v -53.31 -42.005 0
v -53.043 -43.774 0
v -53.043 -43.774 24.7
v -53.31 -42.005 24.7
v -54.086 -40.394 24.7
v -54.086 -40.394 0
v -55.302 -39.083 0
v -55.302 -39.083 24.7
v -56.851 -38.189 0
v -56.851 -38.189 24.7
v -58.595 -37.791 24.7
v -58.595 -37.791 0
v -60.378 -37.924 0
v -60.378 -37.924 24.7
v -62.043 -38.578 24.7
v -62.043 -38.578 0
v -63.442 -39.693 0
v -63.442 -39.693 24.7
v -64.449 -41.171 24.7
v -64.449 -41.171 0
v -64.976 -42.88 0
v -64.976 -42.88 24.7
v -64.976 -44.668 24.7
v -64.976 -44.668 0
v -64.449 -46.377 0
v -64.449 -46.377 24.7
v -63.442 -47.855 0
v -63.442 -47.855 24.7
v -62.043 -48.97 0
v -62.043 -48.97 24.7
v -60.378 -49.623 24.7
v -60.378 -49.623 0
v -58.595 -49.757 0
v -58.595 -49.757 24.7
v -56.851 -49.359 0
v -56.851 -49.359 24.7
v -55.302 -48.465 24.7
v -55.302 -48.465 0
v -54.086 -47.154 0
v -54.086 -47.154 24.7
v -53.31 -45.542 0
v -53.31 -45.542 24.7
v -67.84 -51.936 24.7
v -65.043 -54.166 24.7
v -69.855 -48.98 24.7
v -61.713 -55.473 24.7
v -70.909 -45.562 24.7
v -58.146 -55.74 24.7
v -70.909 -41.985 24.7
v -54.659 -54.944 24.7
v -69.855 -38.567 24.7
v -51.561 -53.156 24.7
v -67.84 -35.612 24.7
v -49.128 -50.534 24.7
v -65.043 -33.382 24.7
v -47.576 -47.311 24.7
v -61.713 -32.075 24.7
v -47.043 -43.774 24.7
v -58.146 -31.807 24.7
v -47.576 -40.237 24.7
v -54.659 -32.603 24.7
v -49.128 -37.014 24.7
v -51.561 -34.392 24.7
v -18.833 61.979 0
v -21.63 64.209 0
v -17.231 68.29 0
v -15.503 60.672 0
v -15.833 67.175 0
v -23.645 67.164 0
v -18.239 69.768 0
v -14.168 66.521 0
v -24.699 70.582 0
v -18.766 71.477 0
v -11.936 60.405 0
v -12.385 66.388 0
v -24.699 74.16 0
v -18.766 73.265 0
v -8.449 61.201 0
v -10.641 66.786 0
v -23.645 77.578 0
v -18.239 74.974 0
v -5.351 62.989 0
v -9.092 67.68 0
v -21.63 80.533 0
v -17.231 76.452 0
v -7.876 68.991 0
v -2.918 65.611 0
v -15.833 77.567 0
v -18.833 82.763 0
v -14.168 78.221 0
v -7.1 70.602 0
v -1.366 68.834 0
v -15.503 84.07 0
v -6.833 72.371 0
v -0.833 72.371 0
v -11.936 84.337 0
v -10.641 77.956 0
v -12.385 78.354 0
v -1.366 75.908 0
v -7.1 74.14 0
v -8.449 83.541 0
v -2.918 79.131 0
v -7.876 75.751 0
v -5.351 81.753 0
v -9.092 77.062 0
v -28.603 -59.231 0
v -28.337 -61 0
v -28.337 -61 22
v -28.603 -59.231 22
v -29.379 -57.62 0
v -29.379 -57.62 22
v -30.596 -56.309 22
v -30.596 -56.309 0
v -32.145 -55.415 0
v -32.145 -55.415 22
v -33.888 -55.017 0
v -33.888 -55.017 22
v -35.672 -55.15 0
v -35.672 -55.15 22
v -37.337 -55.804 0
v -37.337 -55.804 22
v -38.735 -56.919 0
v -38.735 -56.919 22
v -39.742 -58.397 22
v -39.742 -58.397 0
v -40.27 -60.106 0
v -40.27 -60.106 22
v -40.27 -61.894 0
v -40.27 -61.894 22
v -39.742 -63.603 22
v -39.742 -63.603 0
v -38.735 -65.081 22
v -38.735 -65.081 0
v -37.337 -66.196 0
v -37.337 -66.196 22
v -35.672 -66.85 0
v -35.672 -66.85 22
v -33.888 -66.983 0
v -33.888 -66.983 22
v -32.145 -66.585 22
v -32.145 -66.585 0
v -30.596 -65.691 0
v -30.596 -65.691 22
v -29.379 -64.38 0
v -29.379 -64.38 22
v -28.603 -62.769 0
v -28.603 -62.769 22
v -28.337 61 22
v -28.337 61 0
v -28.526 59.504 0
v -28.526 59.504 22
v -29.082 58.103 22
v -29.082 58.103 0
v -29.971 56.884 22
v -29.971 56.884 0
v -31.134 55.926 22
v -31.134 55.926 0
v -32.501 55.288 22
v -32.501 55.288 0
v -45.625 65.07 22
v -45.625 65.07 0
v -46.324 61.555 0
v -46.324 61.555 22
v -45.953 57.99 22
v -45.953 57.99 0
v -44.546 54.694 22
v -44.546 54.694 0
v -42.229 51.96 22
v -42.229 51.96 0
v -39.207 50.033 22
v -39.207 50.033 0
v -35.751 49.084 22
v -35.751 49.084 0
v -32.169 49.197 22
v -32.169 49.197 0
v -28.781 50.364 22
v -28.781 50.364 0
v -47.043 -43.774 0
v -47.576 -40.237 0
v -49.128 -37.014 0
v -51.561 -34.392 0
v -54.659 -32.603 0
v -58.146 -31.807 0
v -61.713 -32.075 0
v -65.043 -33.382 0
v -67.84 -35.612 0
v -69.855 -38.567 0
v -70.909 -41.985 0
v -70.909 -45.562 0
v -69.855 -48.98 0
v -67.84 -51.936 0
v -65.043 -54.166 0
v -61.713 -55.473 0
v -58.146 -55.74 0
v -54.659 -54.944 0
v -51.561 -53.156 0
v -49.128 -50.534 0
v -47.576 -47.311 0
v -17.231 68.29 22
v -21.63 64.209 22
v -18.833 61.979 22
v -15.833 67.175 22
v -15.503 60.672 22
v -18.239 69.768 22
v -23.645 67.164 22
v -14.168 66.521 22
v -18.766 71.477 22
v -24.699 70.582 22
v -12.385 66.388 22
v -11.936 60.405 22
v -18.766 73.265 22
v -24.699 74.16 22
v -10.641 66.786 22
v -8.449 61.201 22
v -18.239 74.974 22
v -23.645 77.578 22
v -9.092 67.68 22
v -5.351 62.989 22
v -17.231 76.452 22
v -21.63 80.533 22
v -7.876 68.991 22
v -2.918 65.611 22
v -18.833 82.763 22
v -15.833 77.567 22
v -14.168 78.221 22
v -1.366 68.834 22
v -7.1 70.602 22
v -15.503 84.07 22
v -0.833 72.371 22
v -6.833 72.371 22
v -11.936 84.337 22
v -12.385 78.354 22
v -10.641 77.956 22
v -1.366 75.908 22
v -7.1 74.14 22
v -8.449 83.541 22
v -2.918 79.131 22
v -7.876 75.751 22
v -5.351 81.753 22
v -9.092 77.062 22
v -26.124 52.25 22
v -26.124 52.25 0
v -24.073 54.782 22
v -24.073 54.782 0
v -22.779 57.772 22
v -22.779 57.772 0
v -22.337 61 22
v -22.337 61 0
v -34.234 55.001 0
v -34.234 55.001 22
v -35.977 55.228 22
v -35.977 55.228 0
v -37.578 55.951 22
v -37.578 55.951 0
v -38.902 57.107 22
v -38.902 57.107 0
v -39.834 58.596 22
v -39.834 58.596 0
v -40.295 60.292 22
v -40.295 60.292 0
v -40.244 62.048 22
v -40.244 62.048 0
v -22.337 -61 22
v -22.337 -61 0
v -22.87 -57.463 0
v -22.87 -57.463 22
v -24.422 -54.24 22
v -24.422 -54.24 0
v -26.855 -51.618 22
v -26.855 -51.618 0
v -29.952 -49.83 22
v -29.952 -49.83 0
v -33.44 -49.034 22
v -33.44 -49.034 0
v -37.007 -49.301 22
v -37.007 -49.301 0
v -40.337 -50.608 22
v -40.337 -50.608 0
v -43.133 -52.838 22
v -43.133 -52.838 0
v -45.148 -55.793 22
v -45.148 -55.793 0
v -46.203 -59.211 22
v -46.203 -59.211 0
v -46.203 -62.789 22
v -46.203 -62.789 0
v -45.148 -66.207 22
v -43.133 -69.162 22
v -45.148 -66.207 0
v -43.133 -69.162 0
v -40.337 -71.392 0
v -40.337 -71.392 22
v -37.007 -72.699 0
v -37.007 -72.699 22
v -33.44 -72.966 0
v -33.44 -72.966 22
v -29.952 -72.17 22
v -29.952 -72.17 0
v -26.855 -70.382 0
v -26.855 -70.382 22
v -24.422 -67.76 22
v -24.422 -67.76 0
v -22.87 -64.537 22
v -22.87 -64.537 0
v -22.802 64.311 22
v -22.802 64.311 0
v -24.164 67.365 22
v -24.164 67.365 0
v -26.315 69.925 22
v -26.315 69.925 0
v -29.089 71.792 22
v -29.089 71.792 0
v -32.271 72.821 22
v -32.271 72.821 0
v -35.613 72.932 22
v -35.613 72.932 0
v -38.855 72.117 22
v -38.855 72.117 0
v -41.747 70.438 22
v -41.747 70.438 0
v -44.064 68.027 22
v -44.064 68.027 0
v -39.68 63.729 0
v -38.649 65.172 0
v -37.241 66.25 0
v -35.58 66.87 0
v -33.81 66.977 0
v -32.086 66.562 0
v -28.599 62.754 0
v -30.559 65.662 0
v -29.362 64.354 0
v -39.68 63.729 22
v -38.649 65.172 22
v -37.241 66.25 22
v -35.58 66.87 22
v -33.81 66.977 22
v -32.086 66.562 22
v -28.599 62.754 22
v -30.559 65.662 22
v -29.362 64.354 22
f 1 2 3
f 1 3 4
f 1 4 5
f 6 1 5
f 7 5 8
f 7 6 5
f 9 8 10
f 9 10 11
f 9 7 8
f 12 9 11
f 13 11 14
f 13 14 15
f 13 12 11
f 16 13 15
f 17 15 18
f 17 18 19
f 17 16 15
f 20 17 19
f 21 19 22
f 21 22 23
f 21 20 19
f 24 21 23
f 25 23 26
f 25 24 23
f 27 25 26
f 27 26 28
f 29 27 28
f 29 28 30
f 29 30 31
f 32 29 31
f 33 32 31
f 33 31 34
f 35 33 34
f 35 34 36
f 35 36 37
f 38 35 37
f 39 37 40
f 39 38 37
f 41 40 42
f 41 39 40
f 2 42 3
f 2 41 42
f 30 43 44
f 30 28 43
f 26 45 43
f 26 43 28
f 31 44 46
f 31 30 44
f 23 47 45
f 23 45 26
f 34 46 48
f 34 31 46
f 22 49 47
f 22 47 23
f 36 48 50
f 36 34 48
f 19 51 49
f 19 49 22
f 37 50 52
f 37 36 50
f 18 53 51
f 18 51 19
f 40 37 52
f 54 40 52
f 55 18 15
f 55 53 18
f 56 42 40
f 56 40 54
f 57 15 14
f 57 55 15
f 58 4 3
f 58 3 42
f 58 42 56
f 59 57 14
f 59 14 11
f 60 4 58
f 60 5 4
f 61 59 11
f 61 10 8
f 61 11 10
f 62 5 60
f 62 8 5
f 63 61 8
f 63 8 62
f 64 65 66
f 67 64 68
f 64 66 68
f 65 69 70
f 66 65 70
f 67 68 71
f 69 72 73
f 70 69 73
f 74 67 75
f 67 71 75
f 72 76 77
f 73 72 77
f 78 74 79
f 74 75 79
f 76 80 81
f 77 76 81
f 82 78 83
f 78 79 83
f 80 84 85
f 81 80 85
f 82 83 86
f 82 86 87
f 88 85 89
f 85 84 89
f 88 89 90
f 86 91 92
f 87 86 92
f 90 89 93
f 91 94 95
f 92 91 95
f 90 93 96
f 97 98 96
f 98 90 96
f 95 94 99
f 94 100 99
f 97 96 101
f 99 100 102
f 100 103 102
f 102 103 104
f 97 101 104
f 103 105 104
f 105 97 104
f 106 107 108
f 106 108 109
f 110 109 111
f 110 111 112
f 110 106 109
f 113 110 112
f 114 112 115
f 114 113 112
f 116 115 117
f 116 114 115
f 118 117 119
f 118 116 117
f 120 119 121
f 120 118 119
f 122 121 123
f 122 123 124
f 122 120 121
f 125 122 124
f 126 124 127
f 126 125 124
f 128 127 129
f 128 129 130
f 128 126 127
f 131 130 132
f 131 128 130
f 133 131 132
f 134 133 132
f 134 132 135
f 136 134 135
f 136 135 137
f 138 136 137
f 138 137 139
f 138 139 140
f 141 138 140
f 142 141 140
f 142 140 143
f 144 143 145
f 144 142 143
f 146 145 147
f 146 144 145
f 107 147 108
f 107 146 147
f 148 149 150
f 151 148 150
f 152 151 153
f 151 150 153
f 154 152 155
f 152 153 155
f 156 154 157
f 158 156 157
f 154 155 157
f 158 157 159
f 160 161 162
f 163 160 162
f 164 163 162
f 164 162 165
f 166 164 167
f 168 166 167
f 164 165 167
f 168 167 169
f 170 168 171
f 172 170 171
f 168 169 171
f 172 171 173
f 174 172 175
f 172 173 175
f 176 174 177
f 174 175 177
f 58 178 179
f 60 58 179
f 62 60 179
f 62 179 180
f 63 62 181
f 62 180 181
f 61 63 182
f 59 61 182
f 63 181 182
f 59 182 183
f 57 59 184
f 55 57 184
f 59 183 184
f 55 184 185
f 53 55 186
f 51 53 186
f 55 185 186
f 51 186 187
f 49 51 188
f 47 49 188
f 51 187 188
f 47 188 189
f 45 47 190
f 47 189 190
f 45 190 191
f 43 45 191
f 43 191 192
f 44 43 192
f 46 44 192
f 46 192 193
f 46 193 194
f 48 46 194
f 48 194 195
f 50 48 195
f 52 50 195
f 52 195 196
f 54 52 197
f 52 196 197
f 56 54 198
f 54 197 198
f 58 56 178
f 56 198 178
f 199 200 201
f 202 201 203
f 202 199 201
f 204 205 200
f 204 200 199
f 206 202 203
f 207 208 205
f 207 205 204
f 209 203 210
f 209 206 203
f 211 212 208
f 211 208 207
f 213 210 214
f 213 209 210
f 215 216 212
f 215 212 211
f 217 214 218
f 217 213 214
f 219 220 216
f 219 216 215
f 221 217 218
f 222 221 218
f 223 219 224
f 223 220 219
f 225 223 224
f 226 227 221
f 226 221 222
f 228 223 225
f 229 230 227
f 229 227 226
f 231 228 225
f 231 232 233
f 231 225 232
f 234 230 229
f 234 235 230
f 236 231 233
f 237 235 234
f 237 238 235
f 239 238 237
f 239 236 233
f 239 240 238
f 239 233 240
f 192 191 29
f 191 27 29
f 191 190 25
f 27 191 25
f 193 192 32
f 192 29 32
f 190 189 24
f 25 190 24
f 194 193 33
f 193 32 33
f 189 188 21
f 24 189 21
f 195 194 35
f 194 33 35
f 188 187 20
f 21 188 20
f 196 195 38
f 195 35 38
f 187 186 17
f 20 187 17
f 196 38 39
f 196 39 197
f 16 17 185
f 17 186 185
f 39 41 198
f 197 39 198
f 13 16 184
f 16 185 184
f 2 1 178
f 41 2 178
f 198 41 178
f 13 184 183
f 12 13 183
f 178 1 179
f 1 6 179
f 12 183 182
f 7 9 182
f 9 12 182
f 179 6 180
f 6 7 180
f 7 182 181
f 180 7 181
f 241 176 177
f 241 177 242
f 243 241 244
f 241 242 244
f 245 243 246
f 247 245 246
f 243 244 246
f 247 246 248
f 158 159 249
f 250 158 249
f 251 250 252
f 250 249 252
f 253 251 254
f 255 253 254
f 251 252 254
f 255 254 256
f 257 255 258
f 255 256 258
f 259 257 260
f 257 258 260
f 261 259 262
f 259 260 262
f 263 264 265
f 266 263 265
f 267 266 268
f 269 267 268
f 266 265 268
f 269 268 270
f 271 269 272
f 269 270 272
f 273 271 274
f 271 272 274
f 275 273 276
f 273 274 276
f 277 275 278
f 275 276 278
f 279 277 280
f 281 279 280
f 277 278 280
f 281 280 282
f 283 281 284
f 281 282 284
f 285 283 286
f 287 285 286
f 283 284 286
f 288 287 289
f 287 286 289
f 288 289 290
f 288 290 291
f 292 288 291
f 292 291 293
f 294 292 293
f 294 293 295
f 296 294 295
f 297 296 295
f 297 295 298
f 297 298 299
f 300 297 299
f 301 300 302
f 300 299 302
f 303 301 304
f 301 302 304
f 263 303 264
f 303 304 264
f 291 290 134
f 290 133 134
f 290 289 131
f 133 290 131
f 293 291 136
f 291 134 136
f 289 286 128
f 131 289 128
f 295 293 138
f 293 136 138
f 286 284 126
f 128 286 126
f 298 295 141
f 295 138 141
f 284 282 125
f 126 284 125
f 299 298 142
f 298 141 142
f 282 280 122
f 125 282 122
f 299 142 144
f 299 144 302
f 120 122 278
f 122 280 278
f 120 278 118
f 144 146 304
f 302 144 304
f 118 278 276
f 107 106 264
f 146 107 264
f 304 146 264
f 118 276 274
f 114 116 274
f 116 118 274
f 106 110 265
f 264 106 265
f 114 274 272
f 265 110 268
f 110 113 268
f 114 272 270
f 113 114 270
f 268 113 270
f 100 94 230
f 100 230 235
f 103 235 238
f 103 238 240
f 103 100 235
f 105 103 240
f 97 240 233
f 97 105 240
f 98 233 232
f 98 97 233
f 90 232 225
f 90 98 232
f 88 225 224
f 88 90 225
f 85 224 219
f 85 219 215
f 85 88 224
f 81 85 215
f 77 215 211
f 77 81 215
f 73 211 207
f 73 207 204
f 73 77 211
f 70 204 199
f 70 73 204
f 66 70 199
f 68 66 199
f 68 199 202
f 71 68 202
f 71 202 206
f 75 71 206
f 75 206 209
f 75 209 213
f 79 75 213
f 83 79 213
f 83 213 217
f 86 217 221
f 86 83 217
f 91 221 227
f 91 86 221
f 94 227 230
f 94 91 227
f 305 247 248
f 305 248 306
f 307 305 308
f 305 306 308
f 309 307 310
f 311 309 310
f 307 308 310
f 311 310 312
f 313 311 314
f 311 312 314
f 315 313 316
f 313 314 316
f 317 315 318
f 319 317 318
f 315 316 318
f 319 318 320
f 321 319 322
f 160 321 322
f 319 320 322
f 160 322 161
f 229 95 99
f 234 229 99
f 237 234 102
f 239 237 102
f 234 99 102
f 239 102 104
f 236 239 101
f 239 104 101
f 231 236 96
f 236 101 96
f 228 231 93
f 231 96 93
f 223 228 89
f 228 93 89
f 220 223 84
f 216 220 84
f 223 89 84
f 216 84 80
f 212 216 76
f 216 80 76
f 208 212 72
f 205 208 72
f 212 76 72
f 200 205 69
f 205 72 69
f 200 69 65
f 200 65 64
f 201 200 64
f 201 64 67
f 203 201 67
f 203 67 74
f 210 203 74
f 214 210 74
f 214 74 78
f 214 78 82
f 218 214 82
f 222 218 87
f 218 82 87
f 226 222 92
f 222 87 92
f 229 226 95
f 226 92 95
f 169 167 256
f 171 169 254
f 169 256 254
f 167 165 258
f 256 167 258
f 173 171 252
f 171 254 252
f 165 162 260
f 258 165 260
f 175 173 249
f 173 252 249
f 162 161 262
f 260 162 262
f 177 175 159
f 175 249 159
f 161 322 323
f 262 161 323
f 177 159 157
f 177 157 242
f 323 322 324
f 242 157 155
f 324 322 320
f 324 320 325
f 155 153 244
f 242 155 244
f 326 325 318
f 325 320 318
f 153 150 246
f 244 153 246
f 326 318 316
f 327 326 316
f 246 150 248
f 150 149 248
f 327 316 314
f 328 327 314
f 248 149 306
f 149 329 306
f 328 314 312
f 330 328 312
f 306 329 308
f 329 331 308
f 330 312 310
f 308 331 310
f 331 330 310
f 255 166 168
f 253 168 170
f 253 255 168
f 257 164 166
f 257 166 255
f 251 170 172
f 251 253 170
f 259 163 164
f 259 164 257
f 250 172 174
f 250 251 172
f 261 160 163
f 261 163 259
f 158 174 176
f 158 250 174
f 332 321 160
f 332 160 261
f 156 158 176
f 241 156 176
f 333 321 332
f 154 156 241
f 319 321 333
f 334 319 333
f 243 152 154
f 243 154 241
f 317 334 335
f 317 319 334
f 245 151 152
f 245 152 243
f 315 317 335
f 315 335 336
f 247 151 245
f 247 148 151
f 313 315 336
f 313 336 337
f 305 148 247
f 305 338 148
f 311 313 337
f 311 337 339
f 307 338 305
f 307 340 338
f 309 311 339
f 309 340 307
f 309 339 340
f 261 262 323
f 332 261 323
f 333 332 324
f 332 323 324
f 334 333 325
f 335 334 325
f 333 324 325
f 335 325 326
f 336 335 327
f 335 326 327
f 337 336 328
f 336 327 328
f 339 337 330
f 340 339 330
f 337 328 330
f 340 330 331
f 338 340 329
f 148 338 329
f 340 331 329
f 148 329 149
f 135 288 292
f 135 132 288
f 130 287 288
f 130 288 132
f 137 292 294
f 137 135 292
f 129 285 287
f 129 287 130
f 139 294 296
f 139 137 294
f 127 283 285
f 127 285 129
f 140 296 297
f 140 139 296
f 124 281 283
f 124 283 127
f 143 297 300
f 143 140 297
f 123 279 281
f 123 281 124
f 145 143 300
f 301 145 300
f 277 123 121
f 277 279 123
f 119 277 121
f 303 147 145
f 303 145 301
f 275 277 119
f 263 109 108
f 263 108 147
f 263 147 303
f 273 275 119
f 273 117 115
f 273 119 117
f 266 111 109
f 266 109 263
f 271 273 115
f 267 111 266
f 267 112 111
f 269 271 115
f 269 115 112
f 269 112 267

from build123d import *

# Parameters (mm, degrees)
F1_DEPTH = 22
F0_R     = 12
F0_R_2   = 6
F2_DEPTH = 24.7


# Not quite as in the source:
# - a feature names something its author has since deleted; it is built from what else it names


with BuildPart() as f1:
    # F0 (on Top) → F1 (new body)
    with BuildSketch(Plane.XY):
        with BuildLine():
            ThreePointArc((-32.5005938447, 55.2878030792), (-38.2826283024, 56.4801969788), (-40.2442501608, 62.0484790627))
            ThreePointArc((-40.2442501608, 62.0484790627), (-42.8763850896, 63.6632298081), (-45.6252412401, 65.070121459))
            ThreePointArc((-45.6252412401, 65.070121459), (-42.2286871779, 51.9603939576), (-28.7805601487, 50.3637054901))
            ThreePointArc((-28.7805601487, 50.3637054901), (-30.5454719824, 52.897603766), (-32.5005938447, 55.2878030792))
        make_face()
        with BuildLine():
            ThreePointArc((-40.2442501608, 62.0484790627), (-33.8103016262, 66.9768756221), (-28.3365694268, 61))
            ThreePointArc((-28.3365694268, 61), (-29.4880720569, 57.465587283), (-32.5005938447, 55.2878030792))
            ThreePointArc((-32.5005938447, 55.2878030792), (-30.5454719824, 52.897603766), (-28.7805601487, 50.3637054901))
            ThreePointArc((-28.7805601487, 50.3637054901), (-24.0732339227, 54.7819662005), (-22.3365694268, 61))
            ThreePointArc((-22.3365694268, 61), (-32.2706630591, 72.8208303803), (-45.6252412401, 65.070121459))
            ThreePointArc((-45.6252412401, 65.070121459), (-42.8763850896, 63.6632298081), (-40.2442501608, 62.0484790627))
        make_face()
    extrude(amount=F1_DEPTH)


with BuildPart() as f1b:
    # F0 (on Top) → F1, piece 2 (new body)
    with BuildSketch(Plane.XY):
        with Locations((-34.3365694268, -61)):
            Circle(F0_R)
        with Locations((-34.3365694268, -61)):
            Circle(F0_R_2, mode=Mode.SUBTRACT)
    extrude(amount=F1_DEPTH)


with BuildPart() as f1c:
    # F0 (on Top) → F1, piece 3 (new body)
    with BuildSketch(Plane.XY):
        with Locations((-12.8330777054, 72.3710032859)):
            Circle(F0_R)
        with Locations((-12.8330777054, 72.3710032859)):
            Circle(F0_R_2, mode=Mode.SUBTRACT)
    extrude(amount=F1_DEPTH)


with BuildPart() as f2:
    # F0 (on Top) → F2 (new body)
    with BuildSketch(Plane.XY):
        with Locations((-59.0432177121, -43.7738328479)):
            Circle(F0_R)
        with Locations((-59.0432177121, -43.7738328479)):
            Circle(F0_R_2, mode=Mode.SUBTRACT)
    extrude(amount=F2_DEPTH)


solid = Compound([f1.part, f1b.part, f1c.part, f2.part])
